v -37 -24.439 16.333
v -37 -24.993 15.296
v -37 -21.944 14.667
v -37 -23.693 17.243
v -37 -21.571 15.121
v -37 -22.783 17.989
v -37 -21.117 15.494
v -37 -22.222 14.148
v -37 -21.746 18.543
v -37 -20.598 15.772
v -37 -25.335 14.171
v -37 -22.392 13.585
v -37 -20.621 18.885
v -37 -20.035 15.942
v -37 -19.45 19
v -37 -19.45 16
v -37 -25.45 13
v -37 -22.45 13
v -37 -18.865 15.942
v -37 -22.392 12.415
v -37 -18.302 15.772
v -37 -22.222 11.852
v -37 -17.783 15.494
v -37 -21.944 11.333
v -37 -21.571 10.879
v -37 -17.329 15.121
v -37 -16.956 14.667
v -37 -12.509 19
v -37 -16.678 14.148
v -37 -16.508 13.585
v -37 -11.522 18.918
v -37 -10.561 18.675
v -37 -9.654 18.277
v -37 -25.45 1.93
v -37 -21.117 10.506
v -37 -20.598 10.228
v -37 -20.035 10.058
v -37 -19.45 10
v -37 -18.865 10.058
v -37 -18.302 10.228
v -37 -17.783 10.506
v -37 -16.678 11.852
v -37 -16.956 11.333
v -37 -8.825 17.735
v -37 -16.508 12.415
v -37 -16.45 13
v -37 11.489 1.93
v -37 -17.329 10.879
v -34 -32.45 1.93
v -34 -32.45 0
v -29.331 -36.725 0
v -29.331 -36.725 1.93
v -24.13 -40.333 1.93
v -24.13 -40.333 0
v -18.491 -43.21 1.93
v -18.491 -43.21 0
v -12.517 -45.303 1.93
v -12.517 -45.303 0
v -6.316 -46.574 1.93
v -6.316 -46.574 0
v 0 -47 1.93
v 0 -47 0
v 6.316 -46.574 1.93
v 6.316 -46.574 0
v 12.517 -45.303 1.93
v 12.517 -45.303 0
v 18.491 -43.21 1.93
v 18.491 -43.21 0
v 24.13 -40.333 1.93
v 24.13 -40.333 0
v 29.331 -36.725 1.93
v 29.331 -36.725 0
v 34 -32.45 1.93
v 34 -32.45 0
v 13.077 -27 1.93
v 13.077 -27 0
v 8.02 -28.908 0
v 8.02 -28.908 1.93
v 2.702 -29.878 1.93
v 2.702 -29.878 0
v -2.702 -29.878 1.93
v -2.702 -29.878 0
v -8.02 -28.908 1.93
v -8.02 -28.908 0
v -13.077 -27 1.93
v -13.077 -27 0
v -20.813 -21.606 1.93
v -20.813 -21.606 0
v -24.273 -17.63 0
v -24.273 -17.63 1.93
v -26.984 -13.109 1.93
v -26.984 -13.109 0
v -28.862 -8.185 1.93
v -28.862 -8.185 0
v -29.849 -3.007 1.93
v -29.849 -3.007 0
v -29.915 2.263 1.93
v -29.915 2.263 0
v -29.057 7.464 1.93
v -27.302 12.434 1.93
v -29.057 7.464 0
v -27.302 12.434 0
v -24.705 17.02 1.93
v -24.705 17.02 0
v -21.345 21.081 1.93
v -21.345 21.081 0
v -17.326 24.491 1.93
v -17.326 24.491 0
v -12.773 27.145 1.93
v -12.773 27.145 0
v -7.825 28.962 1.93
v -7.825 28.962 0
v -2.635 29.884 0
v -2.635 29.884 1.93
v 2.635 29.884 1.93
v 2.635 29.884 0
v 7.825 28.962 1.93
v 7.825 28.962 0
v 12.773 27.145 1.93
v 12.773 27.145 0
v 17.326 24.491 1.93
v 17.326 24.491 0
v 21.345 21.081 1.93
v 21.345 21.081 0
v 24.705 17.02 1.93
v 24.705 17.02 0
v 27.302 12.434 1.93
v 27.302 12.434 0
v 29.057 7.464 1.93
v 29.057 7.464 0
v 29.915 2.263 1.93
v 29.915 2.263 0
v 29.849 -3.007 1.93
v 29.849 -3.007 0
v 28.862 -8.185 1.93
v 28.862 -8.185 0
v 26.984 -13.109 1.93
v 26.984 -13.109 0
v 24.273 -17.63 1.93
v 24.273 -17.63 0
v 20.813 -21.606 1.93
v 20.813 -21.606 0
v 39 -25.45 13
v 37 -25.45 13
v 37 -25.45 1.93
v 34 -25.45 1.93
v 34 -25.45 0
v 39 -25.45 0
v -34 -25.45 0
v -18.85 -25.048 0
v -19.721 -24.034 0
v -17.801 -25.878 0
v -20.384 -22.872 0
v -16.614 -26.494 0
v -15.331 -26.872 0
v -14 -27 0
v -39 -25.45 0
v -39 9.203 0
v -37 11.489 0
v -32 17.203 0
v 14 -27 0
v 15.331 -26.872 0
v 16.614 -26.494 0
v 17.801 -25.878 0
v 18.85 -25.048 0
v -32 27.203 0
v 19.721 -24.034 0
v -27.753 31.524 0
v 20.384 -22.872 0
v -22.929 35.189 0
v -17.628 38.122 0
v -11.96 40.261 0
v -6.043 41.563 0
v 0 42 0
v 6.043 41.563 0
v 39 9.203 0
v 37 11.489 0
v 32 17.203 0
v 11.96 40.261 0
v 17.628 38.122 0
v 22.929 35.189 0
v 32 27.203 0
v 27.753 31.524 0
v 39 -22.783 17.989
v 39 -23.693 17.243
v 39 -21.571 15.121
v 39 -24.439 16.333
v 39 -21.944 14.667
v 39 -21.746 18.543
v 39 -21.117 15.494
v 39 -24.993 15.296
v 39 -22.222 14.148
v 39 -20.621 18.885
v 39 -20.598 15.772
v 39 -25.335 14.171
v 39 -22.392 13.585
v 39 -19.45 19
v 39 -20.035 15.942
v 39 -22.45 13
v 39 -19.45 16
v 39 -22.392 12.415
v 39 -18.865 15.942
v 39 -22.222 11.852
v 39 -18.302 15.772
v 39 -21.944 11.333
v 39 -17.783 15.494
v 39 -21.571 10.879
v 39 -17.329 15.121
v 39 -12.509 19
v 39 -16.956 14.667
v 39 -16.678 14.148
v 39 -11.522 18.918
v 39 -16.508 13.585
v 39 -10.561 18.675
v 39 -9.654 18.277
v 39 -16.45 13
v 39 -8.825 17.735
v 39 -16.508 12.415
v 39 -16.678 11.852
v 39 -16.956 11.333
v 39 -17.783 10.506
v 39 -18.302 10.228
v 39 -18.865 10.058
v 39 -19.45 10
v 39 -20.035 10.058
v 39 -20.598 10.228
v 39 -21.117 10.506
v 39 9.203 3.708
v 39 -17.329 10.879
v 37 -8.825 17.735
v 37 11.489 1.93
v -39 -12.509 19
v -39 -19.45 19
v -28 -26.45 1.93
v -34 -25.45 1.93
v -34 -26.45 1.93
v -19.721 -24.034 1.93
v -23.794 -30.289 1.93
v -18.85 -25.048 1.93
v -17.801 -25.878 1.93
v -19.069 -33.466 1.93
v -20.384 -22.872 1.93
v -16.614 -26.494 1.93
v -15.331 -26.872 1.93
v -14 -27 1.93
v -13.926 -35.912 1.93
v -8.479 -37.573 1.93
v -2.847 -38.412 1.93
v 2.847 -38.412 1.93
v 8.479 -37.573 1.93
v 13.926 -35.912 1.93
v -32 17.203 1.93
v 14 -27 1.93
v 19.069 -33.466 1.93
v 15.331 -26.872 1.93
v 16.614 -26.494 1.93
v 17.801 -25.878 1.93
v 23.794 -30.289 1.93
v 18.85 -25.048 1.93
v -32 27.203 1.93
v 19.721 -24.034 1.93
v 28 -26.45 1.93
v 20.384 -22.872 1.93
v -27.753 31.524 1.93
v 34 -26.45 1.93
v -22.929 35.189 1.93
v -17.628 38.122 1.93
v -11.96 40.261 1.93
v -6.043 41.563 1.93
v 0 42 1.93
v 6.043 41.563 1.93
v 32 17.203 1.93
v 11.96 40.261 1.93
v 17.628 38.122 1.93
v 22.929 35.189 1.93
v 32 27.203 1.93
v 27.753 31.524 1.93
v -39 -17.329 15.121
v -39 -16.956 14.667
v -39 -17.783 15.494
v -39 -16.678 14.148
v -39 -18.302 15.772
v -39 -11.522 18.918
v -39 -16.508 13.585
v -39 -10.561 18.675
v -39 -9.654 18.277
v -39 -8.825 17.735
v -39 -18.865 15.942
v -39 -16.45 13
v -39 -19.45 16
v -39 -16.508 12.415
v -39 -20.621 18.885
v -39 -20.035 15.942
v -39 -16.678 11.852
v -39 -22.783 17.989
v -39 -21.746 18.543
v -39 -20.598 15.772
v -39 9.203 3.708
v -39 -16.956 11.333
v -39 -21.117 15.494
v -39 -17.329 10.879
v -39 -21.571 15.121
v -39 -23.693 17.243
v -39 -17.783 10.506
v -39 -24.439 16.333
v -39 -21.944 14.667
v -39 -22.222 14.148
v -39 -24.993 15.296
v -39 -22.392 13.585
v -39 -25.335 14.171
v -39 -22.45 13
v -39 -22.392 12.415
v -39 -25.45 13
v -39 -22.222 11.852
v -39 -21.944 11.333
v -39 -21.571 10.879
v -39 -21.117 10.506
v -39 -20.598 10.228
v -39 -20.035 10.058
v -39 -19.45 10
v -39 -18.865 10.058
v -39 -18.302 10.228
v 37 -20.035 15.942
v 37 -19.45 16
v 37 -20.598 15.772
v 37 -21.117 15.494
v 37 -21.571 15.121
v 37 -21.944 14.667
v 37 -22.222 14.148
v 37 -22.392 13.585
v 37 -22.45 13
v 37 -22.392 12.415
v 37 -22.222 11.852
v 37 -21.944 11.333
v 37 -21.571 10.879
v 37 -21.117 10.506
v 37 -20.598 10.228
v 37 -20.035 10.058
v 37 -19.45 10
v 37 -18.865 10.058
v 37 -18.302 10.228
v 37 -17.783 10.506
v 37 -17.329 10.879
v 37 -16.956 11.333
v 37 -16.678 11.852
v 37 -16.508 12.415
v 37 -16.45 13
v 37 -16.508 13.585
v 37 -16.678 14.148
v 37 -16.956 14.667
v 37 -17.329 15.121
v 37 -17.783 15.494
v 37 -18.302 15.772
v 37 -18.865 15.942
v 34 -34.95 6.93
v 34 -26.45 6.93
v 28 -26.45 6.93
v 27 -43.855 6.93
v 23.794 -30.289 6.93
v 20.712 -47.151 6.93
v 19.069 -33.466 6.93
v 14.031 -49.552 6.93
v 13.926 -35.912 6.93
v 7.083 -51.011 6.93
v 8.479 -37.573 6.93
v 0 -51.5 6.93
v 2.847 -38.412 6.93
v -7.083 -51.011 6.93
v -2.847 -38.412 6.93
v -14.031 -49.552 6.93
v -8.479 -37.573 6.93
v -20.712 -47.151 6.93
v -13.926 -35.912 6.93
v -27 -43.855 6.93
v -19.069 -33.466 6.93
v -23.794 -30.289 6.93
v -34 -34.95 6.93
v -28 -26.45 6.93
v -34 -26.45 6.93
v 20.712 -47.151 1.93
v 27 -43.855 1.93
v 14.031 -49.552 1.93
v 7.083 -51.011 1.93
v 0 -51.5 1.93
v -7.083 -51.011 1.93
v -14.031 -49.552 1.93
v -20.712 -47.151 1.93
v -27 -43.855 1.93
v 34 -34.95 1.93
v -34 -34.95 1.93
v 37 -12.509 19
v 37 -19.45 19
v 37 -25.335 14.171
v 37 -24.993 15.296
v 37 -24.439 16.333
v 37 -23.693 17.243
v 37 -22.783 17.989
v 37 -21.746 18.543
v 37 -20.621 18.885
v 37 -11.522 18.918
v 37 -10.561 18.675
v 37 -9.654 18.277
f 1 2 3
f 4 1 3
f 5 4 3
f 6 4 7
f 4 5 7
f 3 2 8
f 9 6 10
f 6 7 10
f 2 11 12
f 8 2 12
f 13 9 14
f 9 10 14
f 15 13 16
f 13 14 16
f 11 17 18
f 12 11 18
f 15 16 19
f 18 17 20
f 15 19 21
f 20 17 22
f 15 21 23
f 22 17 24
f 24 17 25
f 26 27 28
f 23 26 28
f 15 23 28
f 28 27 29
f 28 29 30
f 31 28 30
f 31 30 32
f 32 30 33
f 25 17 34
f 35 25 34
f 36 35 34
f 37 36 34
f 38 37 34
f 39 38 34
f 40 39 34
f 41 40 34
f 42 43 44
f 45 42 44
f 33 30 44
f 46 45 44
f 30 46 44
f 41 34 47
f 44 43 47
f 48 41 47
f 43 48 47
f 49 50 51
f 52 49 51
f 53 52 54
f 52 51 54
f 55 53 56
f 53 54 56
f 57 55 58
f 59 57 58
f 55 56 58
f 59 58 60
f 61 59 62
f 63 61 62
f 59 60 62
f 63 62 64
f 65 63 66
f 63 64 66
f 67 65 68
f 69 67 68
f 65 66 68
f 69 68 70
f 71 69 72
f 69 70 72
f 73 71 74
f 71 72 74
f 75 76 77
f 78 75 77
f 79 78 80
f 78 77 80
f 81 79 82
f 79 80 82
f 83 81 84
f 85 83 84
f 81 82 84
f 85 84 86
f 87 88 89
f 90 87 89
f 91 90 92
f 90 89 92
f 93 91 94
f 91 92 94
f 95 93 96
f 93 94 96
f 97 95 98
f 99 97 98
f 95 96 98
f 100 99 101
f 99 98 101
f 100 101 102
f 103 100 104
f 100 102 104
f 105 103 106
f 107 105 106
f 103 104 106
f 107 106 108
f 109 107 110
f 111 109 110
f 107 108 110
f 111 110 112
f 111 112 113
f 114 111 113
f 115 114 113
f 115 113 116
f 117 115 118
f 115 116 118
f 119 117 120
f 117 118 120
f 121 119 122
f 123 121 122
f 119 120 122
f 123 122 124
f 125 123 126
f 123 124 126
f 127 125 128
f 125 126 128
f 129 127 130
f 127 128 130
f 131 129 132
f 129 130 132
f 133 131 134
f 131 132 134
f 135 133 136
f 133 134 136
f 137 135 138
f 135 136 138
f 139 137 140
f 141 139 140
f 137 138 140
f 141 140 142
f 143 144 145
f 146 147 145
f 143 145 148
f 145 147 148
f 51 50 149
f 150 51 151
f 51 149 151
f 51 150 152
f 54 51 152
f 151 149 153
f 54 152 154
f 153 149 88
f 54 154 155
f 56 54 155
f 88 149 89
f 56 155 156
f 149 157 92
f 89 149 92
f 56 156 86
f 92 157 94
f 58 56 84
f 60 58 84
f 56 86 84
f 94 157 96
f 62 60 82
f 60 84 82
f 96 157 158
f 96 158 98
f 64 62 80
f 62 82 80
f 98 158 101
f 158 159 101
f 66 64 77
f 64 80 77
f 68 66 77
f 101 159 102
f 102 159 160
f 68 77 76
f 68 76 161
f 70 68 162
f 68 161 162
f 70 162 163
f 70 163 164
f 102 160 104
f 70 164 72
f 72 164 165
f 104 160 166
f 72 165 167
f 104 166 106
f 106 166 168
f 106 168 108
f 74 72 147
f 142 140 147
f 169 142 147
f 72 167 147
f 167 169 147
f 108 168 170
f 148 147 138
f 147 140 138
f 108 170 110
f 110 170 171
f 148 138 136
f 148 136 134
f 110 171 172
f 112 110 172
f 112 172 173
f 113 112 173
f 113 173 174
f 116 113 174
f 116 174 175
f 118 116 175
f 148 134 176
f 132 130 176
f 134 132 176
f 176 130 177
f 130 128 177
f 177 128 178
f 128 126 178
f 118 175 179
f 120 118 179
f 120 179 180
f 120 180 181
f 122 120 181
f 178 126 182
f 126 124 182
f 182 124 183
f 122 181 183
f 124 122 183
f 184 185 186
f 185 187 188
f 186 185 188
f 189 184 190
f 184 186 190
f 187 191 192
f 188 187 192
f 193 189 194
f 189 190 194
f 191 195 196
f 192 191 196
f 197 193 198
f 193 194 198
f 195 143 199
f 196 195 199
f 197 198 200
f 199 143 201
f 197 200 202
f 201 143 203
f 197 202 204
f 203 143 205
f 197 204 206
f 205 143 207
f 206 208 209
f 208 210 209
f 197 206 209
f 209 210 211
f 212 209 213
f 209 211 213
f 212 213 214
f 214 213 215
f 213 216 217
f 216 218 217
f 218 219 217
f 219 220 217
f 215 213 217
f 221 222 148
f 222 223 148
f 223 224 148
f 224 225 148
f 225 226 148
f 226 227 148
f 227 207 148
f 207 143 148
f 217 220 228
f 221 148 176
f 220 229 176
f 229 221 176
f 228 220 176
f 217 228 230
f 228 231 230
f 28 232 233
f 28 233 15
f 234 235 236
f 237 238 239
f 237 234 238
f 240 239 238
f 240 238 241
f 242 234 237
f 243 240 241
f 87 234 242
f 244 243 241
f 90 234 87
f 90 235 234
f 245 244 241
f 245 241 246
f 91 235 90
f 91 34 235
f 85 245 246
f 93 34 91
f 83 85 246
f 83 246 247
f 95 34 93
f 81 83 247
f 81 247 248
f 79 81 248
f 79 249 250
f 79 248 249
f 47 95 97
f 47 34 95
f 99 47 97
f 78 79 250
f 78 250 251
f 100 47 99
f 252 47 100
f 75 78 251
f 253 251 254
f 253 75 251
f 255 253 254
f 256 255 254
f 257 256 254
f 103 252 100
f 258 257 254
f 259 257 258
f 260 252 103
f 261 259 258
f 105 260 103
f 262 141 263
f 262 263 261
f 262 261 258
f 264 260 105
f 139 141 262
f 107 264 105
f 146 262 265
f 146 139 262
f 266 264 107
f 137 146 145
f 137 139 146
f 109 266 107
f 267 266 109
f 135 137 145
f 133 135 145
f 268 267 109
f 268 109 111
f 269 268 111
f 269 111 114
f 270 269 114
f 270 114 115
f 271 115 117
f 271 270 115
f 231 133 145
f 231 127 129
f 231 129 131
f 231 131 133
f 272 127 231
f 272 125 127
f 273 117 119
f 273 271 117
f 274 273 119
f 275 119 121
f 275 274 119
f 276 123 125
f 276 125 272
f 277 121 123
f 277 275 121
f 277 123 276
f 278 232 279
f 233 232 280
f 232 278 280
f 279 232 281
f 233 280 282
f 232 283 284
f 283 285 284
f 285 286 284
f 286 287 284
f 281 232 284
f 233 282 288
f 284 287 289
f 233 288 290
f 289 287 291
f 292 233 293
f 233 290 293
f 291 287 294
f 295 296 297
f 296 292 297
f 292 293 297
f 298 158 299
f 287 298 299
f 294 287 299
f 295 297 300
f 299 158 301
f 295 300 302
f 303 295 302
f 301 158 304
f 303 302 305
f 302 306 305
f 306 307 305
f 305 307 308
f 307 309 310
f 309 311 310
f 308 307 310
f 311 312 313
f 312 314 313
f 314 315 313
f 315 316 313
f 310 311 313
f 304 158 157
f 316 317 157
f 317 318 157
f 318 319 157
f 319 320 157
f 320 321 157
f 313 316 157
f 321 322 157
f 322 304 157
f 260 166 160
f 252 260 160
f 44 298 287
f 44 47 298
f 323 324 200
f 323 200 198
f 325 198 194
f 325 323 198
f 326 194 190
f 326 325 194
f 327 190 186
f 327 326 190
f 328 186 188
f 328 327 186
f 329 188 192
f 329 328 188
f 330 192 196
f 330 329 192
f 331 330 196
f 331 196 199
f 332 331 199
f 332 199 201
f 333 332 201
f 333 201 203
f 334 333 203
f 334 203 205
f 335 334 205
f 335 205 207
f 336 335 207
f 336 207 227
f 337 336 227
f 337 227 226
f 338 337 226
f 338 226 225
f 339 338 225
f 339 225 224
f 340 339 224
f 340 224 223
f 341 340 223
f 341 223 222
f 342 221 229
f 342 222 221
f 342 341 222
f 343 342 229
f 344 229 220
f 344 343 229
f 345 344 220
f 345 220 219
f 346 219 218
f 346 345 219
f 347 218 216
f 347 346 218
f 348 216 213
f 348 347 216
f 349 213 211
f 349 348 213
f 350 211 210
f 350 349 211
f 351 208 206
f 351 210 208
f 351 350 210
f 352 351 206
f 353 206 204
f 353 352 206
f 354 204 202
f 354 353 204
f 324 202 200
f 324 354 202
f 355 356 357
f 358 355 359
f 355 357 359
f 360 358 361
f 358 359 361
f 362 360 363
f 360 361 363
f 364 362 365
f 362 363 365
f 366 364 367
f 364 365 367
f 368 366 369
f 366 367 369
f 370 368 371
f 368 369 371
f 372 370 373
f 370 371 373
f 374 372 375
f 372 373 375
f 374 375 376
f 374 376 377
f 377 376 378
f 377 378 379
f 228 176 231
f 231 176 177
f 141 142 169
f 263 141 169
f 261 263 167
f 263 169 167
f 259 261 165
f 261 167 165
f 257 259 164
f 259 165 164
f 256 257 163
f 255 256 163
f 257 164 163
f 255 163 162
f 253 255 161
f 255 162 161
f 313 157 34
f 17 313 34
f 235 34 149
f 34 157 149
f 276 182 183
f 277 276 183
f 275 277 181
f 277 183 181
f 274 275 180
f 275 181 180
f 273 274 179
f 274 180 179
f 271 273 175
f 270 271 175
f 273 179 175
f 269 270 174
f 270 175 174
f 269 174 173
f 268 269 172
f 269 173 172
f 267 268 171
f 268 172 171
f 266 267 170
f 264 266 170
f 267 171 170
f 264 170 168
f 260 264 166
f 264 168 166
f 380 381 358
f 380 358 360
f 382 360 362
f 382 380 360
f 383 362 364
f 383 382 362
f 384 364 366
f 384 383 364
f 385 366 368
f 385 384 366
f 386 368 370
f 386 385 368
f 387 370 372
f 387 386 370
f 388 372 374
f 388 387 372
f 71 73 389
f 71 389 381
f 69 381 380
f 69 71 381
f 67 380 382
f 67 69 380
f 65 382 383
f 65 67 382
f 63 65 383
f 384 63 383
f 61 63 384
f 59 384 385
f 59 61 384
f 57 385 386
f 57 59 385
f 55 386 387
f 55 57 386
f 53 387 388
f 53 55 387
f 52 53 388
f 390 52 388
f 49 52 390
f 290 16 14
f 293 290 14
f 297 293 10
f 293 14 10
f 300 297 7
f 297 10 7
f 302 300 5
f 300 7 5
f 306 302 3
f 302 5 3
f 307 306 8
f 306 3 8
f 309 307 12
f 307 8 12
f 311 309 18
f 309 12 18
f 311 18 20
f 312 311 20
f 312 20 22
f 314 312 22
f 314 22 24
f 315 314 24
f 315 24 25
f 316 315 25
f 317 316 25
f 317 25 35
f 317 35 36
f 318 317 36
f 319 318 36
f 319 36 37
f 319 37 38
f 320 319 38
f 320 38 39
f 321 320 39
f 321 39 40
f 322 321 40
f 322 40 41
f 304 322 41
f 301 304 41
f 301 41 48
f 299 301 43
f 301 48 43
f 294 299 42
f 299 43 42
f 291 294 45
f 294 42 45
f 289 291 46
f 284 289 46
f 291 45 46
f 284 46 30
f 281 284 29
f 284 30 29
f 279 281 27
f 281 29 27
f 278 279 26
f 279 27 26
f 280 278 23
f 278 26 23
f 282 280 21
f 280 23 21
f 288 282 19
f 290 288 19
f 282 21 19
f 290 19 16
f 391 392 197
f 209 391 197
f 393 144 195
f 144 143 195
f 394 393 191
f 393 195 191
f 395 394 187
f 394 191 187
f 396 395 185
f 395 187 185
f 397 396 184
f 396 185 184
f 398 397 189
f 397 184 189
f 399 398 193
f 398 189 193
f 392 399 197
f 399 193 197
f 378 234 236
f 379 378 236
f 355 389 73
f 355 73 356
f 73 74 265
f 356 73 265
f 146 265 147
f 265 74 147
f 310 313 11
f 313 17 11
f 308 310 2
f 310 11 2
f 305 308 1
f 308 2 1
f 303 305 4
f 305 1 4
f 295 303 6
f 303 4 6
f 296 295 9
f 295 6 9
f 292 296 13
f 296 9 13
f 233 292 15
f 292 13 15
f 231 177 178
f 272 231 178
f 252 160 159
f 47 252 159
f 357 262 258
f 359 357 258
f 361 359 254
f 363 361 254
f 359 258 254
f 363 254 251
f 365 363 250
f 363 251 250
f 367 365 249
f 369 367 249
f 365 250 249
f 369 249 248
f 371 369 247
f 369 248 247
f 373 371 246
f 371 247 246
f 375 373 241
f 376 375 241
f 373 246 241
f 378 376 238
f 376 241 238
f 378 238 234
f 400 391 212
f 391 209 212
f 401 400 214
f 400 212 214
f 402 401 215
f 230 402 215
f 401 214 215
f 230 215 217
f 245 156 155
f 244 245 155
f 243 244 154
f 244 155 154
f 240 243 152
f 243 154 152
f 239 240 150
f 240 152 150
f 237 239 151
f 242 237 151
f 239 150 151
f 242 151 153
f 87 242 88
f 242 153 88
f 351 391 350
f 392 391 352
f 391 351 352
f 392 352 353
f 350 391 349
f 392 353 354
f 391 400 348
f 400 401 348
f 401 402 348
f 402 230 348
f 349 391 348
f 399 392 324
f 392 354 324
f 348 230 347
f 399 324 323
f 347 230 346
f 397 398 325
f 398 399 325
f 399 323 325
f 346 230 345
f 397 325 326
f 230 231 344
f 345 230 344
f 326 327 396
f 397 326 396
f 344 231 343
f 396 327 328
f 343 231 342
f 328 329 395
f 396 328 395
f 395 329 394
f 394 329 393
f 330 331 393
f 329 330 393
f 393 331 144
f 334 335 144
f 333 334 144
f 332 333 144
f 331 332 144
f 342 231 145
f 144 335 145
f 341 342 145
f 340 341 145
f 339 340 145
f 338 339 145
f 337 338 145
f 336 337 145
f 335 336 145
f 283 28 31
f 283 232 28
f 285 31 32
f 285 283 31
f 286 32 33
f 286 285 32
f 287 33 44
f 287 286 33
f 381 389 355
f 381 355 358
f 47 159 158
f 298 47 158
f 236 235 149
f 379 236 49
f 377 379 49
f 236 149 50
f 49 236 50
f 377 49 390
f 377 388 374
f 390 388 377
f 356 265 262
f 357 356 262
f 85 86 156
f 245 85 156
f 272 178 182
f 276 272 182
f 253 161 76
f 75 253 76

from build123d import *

# Parameters (mm, degrees)
BOSS_EXTRUDE1_DEPTH            = 1.93
BOSS_EXTRUDE2_START            = 1.93
BOSS_EXTRUDE2_DEPTH            = 5
BOSS_EXTRUDE3_DEPTH            = 19
CUT_EXTRUDE1_REACH             = 69.337
CUT_EXTRUDE1_DIRECTION_2_REACH = 69.337
FILLET1_R                      = 6
CUT_EXTRUDE2_REACH             = 69.337
SKETCH5_R                      = 3
CUT_EXTRUDE2_DIRECTION_2_REACH = 69.337


with BuildPart() as part:
    # Sketch1 → Boss-Extrude1 (new body)
    # profile 1 of 4: a face of its own
    with BuildSketch(Plane.XY):
        with BuildLine():
            ThreePointArc((32, 27.202941017), (0, 42), (-32, 27.202941017))
            Line((-32, 27.202941017), (-32, 17.202941017))
            Line((-32, 17.202941017), (-37, 11.488655303))
            Line((-37, 11.488655303), (-37, -25.449961479))
            Line((-37, -25.449961479), (-34, -25.449961479))
            Line((-34, -25.449961479), (-34, -26.449961479))
            Line((-34, -26.449961479), (-28, -26.449961479))
            ThreePointArc((-28, -26.449961479), (0, -38.517534478), (28, -26.449961479))
            Line((28, -26.449961479), (34, -26.449961479))
            Line((34, -26.449961479), (34, -25.449961479))
            Line((34, -25.449961479), (37, -25.449961479))
            Line((37, -25.449961479), (37, 11.488655303))
            Line((37, 11.488655303), (32, 17.202941017))
            Line((32, 17.202941017), (32, 27.202941017))
        make_face()
        with BuildLine():
            Line((-13.076696831, -27), (-14, -27))
            ThreePointArc((-14, -27), (-18.345139389, -25.488147565), (-20.813361759, -21.605646769))
            ThreePointArc((-20.813361759, -21.605646769), (0, 30), (20.813361759, -21.605646769))
            ThreePointArc((20.813361759, -21.605646769), (18.345139389, -25.488147565), (14, -27))
            Line((14, -27), (13.076696831, -27))
            ThreePointArc((13.076696831, -27), (0, -30), (-13.076696831, -27))
        make_face(mode=Mode.SUBTRACT)
    # profile 2 of 4: a face of its own
    with BuildSketch(Plane.XY):
        Polygon((-37, -25.449961479), (-37, 11.488655303), (-39, 9.202941017), (-39, -25.449961479), align=None)
    # profile 3 of 4: a face of its own
    with BuildSketch(Plane.XY):
        Polygon((39, 9.202941017), (37, 11.488655303), (37, -25.449961479), (39, -25.449961479), align=None)
    # profile 4 of 4: a face of its own
    with BuildSketch(Plane.XY):
        with BuildLine():
            Line((-28, -26.449961479), (-34, -26.449961479))
            Line((-34, -26.449961479), (-34, -32.449961479))
            ThreePointArc((-34, -32.449961479), (0, -47), (34, -32.449961479))
            Line((34, -32.449961479), (34, -26.449961479))
            Line((34, -26.449961479), (28, -26.449961479))
            ThreePointArc((28, -26.449961479), (0, -38.517534478), (-28, -26.449961479))
        make_face()
    extrude(amount=BOSS_EXTRUDE1_DEPTH)

    # Sketch1<3> → Boss-Extrude2 (add)
    with BuildSketch(Plane.XY.offset(BOSS_EXTRUDE2_START)):
        with BuildLine():
            Line((-27, -43.854874301), (-34, -34.949961479))
            Line((-34, -34.949961479), (-34, -32.449961479))
            ThreePointArc((-34, -32.449961479), (0, -47), (34, -32.449961479))
            Line((34, -32.449961479), (34, -34.949961479))
            Line((34, -34.949961479), (27, -43.854874301))
            ThreePointArc((27, -43.854874301), (0, -51.5), (-27, -43.854874301))
        make_face()
        with BuildLine():
            Line((-28, -26.449961479), (-34, -26.449961479))
            Line((-34, -26.449961479), (-34, -32.449961479))
            ThreePointArc((-34, -32.449961479), (0, -47), (34, -32.449961479))
            Line((34, -32.449961479), (34, -26.449961479))
            Line((34, -26.449961479), (28, -26.449961479))
            ThreePointArc((28, -26.449961479), (0, -38.517534478), (-28, -26.449961479))
        make_face()
    extrude(amount=BOSS_EXTRUDE2_DEPTH)

    # Sketch1<4> → Boss-Extrude3 (add)
    with BuildSketch(Plane.XY):
        Polygon((-37, -25.449961479), (-37, 11.488655303), (-39, 9.202941017), (-39, -25.449961479), align=None)
        Polygon((39, 9.202941017), (37, 11.488655303), (37, -25.449961479), (39, -25.449961479), align=None)
    extrude(amount=BOSS_EXTRUDE3_DEPTH)

    # Sketch3 → Cut-Extrude1 (cut, up to next)
    with BuildSketch(Plane(origin=(0, 0, 0), x_dir=(0, 0, -1), z_dir=(1, 0, 0)), mode=Mode.PRIVATE) as cut_extrude1_sk1:
        Polygon((-1.93, 11.488655303), (-19, -10.449961479), (-19, 9.202941017), (-19, 11.488655303), align=None)
    cut_extrude1_tool1 = extrude(cut_extrude1_sk1.sketch, amount=-CUT_EXTRUDE1_REACH, mode=Mode.PRIVATE) & part.part
    add(cut_extrude1_tool1.solids().sort_by_distance((0, 4.175783, 13.31))[0], mode=Mode.SUBTRACT)

    # Sketch3 → Cut-Extrude1 direction 2 (cut, up to next)
    with BuildSketch(Plane(origin=(0, 0, 0), x_dir=(0, 0, -1), z_dir=(1, 0, 0)), mode=Mode.PRIVATE) as cut_extrude1_direction_2_sk1:
        Polygon((-1.93, 11.488655303), (-19, -10.449961479), (-19, 9.202941017), (-19, 11.488655303), align=None)
    cut_extrude1_direction_2_tool1 = extrude(cut_extrude1_direction_2_sk1.sketch, amount=CUT_EXTRUDE1_DIRECTION_2_REACH, mode=Mode.PRIVATE) & part.part
    add(cut_extrude1_direction_2_tool1.solids().sort_by_distance((0, 4.175783, 13.31))[0], mode=Mode.SUBTRACT)

    # Fillet1
    fillet1_edges = [part.edges().sort_by_distance(p)[0] for p in [
        (38, -25.449961479, 19),
        (38, -10.449961479, 19),
        (-38, -10.449961479, 19),
        (-38, -25.449961479, 19),
    ]]
    fillet(fillet1_edges, radius=FILLET1_R)

    # Sketch5 → Cut-Extrude2 (cut, up to next)
    with BuildSketch(Plane(origin=(0, 0, 0), x_dir=(0, 0, -1), z_dir=(1, 0, 0)), mode=Mode.PRIVATE) as cut_extrude2_sk1:
        with Locations(Location((-13, -19.449961479, 0), (0, 0, 180))):
            Circle(SKETCH5_R)
    cut_extrude2_tool1 = extrude(cut_extrude2_sk1.sketch, amount=-CUT_EXTRUDE2_REACH, mode=Mode.PRIVATE) & part.part
    add(cut_extrude2_tool1.solids().sort_by_distance((0, -19.449961, 13))[0], mode=Mode.SUBTRACT)

    # Sketch5 → Cut-Extrude2 direction 2 (cut, up to next)
    with BuildSketch(Plane(origin=(0, 0, 0), x_dir=(0, 0, -1), z_dir=(1, 0, 0)), mode=Mode.PRIVATE) as cut_extrude2_direction_2_sk1:
        with Locations(Location((-13, -19.449961479, 0), (0, 0, 180))):
            Circle(SKETCH5_R)
    cut_extrude2_direction_2_tool1 = extrude(cut_extrude2_direction_2_sk1.sketch, amount=CUT_EXTRUDE2_DIRECTION_2_REACH, mode=Mode.PRIVATE) & part.part
    add(cut_extrude2_direction_2_tool1.solids().sort_by_distance((0, -19.449961, 13))[0], mode=Mode.SUBTRACT)


solid = part.part
